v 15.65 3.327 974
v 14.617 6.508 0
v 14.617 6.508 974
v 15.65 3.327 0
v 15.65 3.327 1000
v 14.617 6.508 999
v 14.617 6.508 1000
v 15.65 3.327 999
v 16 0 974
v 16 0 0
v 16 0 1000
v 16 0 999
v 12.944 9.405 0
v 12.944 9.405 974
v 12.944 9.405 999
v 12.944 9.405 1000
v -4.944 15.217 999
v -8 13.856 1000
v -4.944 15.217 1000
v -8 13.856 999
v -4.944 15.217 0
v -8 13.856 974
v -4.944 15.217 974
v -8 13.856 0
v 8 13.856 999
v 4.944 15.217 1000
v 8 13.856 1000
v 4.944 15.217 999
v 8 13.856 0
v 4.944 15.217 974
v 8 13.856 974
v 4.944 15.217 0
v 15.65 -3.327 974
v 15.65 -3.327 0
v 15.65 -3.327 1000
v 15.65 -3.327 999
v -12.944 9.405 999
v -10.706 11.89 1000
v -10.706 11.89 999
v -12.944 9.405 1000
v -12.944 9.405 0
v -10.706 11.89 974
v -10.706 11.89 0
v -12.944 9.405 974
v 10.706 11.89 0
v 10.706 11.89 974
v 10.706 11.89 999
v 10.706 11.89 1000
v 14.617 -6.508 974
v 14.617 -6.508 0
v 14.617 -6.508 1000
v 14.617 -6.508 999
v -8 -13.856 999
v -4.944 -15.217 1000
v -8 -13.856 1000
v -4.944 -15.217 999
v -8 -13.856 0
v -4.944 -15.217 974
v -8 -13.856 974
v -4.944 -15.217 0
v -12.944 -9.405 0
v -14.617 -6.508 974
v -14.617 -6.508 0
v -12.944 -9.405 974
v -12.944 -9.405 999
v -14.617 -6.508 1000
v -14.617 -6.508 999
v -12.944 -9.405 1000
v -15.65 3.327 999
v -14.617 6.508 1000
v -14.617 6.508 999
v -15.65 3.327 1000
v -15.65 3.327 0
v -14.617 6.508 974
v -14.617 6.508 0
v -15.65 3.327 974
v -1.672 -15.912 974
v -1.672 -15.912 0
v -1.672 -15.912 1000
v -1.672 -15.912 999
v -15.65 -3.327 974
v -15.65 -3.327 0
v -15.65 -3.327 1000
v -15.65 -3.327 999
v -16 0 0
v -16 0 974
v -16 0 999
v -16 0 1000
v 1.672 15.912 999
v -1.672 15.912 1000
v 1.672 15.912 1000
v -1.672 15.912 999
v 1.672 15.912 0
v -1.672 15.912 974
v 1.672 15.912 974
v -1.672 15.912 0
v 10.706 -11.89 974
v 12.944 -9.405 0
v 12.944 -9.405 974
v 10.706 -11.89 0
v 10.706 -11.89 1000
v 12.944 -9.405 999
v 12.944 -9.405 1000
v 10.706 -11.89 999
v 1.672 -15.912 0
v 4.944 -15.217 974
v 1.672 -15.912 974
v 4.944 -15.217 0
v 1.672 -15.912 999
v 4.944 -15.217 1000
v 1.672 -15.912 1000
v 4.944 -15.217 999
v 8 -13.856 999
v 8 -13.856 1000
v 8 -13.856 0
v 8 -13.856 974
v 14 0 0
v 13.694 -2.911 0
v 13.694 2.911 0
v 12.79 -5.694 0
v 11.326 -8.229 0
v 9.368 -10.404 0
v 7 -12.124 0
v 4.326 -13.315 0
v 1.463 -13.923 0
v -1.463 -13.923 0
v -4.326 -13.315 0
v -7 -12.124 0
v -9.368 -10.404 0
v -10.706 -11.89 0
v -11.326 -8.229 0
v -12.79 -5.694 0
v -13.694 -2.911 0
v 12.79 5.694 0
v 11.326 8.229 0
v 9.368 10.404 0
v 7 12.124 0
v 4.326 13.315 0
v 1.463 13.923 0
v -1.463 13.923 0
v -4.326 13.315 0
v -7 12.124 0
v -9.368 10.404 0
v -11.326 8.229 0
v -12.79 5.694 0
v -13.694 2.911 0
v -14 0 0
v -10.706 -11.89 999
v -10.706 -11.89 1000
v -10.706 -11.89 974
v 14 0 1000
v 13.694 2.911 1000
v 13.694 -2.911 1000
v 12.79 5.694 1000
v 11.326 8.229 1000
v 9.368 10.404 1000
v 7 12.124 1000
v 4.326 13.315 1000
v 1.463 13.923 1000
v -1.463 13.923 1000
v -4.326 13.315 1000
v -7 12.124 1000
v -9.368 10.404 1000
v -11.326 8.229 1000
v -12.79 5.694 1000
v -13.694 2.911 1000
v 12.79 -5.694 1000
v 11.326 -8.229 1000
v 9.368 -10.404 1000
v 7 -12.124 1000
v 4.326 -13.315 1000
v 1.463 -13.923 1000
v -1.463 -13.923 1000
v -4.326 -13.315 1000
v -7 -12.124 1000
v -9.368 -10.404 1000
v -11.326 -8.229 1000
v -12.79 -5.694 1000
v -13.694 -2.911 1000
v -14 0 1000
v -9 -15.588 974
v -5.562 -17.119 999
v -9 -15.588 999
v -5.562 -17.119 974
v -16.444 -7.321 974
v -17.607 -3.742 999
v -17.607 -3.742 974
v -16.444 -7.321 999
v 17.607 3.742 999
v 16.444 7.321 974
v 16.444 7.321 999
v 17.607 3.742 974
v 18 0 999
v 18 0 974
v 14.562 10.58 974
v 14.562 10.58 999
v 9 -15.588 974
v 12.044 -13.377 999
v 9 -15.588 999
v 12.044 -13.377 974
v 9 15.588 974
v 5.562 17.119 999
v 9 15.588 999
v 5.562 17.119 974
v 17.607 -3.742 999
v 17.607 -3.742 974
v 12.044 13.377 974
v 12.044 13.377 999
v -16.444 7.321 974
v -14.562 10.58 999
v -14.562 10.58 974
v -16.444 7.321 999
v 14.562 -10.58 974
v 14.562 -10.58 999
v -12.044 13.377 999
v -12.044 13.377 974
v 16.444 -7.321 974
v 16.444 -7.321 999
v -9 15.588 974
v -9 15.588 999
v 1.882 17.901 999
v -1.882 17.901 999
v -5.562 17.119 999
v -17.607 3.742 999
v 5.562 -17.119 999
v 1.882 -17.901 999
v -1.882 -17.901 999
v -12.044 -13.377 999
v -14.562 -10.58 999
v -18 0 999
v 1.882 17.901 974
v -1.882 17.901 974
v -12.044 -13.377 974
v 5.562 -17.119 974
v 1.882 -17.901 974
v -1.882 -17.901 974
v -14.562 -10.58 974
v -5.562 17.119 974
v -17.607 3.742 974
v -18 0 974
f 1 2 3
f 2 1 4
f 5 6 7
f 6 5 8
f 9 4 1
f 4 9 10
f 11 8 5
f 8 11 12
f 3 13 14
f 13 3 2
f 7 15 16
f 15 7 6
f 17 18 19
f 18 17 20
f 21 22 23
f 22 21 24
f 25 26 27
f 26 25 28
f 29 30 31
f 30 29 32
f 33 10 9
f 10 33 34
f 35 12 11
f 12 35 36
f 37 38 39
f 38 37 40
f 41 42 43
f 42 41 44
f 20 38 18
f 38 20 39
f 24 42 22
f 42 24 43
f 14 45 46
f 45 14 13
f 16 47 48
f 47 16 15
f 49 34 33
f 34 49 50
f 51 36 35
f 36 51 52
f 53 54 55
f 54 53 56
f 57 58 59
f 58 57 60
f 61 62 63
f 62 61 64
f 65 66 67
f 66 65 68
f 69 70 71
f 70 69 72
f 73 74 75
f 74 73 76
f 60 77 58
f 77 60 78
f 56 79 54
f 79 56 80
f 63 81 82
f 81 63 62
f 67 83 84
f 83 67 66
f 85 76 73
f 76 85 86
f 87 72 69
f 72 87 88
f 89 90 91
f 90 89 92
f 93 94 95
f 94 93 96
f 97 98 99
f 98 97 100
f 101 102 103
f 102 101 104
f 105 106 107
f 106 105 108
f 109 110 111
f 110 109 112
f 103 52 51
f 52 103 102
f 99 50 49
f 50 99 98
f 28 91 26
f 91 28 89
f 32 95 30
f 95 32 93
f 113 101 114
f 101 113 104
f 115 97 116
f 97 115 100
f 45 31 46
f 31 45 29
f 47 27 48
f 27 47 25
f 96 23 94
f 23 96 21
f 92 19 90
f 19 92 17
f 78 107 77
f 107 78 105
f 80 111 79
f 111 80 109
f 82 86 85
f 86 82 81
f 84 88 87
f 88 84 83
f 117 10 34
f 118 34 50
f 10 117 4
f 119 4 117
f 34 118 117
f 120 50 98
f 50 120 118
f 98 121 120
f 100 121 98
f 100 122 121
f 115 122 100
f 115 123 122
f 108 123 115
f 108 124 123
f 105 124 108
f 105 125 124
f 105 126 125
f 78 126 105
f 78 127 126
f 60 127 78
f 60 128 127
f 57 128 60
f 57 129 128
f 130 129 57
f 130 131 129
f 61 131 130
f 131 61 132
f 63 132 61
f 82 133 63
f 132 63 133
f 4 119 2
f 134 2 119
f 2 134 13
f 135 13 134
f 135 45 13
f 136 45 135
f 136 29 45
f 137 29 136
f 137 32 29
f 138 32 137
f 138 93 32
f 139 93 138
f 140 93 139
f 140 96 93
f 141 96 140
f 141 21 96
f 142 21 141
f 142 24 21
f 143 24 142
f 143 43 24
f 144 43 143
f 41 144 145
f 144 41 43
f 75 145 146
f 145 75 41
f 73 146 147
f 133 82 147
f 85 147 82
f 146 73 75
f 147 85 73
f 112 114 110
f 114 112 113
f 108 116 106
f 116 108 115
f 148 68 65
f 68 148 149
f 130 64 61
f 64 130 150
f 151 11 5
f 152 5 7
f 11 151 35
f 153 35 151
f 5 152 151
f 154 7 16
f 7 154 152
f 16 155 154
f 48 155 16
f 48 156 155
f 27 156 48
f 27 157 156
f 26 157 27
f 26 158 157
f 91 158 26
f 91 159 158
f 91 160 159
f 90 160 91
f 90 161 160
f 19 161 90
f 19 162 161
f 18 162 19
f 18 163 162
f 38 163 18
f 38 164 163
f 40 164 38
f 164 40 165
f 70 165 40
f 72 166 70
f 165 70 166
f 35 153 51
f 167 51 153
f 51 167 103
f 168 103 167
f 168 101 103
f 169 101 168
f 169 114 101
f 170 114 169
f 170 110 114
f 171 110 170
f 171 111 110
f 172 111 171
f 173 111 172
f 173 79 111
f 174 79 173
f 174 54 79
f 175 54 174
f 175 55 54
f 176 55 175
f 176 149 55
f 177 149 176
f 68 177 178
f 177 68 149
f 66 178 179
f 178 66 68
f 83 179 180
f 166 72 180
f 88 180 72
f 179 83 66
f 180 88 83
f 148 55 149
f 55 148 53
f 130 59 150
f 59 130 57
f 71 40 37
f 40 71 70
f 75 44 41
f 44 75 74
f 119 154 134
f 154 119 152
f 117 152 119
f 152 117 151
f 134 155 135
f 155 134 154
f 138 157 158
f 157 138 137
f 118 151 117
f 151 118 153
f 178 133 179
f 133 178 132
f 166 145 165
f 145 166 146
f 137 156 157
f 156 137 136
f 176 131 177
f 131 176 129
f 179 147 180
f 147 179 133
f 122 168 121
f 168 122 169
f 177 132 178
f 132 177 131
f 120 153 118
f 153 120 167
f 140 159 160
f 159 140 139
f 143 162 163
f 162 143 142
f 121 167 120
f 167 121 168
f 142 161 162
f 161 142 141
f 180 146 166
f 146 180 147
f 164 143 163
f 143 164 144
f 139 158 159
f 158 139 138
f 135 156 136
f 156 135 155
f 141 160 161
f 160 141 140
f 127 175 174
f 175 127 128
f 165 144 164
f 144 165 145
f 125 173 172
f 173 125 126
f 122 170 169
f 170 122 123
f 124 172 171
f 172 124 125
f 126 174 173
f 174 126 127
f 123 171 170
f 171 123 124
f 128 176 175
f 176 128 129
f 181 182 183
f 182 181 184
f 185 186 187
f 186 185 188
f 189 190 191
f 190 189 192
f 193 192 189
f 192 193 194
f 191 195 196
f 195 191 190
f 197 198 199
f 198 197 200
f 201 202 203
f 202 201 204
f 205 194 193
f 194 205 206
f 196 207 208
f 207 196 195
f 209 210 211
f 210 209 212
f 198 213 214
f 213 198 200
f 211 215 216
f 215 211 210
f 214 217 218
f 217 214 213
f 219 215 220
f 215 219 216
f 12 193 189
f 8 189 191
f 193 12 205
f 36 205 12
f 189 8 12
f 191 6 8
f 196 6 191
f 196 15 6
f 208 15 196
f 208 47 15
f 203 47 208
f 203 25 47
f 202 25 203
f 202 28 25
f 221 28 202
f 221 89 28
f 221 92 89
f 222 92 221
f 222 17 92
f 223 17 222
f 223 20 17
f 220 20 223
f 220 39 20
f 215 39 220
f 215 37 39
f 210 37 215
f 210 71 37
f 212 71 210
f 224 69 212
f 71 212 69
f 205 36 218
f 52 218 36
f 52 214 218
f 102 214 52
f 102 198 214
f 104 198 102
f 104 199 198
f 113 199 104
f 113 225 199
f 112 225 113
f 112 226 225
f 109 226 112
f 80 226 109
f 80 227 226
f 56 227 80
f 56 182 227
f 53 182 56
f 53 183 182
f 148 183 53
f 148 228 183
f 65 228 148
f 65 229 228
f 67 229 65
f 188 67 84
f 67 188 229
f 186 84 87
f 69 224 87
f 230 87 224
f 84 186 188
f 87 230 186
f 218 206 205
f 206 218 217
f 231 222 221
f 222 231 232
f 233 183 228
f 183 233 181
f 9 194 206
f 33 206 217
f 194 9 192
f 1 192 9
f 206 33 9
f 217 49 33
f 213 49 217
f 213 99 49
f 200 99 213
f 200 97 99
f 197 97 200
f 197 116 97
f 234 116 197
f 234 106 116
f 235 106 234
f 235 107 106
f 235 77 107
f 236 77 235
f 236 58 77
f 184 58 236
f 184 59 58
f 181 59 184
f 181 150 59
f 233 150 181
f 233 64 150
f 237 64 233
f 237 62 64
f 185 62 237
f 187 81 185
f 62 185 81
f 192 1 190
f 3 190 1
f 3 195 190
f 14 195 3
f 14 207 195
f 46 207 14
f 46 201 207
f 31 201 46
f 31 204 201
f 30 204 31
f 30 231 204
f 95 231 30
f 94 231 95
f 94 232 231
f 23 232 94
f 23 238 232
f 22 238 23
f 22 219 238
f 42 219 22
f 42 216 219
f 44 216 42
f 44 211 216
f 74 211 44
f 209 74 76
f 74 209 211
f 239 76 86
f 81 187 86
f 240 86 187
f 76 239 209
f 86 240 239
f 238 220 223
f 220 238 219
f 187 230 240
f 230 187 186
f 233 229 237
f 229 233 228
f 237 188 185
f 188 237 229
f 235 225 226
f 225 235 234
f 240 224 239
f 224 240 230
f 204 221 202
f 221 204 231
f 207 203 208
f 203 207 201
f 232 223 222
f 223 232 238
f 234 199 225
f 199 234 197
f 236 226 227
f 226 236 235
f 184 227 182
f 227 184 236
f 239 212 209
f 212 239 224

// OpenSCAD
// Parameters
pipe_standard = 1; //[1:1:1]
nominal_diameter_mm = 32; //[16:64:1]
length_mm = 1000; //[500:2000:10]
pipe_od_mm = 32; //[16:64:1]
wall_thickness_mm = 2.0; //[1.0:4.0:0.1]
end_fitting_length_mm = 25; //[10:60:1]
end_fitting_radial_add_mm = 2.0; //[0.5:6.0:0.1]
overlap_mm = 1.0; //[0.5:2.0:0.1]

// HT Pipe - complete geometry
module ht_pipe() {
  color([0.85, 0.85, 0.8]) {
    // Pipe body
    difference() {
      cylinder(h=length_mm, r=pipe_od_mm/2, center=false);
      translate([0, 0, -overlap_mm/2])
        cylinder(h=length_mm + overlap_mm, r=pipe_od_mm/2 - wall_thickness_mm, center=false);
    }
    
    // End fitting detail
    translate([0, 0, length_mm - end_fitting_length_mm - overlap_mm]) {
      difference() {
        cylinder(h=end_fitting_length_mm, r=pipe_od_mm/2 + end_fitting_radial_add_mm, center=false);
        translate([0, 0, -overlap_mm/2])
          cylinder(h=end_fitting_length_mm + overlap_mm, r=pipe_od_mm/2 - wall_thickness_mm, center=false);
      }
    }
  }
}

// Assembly
module assembly() {
  ht_pipe();
}

assembly();
